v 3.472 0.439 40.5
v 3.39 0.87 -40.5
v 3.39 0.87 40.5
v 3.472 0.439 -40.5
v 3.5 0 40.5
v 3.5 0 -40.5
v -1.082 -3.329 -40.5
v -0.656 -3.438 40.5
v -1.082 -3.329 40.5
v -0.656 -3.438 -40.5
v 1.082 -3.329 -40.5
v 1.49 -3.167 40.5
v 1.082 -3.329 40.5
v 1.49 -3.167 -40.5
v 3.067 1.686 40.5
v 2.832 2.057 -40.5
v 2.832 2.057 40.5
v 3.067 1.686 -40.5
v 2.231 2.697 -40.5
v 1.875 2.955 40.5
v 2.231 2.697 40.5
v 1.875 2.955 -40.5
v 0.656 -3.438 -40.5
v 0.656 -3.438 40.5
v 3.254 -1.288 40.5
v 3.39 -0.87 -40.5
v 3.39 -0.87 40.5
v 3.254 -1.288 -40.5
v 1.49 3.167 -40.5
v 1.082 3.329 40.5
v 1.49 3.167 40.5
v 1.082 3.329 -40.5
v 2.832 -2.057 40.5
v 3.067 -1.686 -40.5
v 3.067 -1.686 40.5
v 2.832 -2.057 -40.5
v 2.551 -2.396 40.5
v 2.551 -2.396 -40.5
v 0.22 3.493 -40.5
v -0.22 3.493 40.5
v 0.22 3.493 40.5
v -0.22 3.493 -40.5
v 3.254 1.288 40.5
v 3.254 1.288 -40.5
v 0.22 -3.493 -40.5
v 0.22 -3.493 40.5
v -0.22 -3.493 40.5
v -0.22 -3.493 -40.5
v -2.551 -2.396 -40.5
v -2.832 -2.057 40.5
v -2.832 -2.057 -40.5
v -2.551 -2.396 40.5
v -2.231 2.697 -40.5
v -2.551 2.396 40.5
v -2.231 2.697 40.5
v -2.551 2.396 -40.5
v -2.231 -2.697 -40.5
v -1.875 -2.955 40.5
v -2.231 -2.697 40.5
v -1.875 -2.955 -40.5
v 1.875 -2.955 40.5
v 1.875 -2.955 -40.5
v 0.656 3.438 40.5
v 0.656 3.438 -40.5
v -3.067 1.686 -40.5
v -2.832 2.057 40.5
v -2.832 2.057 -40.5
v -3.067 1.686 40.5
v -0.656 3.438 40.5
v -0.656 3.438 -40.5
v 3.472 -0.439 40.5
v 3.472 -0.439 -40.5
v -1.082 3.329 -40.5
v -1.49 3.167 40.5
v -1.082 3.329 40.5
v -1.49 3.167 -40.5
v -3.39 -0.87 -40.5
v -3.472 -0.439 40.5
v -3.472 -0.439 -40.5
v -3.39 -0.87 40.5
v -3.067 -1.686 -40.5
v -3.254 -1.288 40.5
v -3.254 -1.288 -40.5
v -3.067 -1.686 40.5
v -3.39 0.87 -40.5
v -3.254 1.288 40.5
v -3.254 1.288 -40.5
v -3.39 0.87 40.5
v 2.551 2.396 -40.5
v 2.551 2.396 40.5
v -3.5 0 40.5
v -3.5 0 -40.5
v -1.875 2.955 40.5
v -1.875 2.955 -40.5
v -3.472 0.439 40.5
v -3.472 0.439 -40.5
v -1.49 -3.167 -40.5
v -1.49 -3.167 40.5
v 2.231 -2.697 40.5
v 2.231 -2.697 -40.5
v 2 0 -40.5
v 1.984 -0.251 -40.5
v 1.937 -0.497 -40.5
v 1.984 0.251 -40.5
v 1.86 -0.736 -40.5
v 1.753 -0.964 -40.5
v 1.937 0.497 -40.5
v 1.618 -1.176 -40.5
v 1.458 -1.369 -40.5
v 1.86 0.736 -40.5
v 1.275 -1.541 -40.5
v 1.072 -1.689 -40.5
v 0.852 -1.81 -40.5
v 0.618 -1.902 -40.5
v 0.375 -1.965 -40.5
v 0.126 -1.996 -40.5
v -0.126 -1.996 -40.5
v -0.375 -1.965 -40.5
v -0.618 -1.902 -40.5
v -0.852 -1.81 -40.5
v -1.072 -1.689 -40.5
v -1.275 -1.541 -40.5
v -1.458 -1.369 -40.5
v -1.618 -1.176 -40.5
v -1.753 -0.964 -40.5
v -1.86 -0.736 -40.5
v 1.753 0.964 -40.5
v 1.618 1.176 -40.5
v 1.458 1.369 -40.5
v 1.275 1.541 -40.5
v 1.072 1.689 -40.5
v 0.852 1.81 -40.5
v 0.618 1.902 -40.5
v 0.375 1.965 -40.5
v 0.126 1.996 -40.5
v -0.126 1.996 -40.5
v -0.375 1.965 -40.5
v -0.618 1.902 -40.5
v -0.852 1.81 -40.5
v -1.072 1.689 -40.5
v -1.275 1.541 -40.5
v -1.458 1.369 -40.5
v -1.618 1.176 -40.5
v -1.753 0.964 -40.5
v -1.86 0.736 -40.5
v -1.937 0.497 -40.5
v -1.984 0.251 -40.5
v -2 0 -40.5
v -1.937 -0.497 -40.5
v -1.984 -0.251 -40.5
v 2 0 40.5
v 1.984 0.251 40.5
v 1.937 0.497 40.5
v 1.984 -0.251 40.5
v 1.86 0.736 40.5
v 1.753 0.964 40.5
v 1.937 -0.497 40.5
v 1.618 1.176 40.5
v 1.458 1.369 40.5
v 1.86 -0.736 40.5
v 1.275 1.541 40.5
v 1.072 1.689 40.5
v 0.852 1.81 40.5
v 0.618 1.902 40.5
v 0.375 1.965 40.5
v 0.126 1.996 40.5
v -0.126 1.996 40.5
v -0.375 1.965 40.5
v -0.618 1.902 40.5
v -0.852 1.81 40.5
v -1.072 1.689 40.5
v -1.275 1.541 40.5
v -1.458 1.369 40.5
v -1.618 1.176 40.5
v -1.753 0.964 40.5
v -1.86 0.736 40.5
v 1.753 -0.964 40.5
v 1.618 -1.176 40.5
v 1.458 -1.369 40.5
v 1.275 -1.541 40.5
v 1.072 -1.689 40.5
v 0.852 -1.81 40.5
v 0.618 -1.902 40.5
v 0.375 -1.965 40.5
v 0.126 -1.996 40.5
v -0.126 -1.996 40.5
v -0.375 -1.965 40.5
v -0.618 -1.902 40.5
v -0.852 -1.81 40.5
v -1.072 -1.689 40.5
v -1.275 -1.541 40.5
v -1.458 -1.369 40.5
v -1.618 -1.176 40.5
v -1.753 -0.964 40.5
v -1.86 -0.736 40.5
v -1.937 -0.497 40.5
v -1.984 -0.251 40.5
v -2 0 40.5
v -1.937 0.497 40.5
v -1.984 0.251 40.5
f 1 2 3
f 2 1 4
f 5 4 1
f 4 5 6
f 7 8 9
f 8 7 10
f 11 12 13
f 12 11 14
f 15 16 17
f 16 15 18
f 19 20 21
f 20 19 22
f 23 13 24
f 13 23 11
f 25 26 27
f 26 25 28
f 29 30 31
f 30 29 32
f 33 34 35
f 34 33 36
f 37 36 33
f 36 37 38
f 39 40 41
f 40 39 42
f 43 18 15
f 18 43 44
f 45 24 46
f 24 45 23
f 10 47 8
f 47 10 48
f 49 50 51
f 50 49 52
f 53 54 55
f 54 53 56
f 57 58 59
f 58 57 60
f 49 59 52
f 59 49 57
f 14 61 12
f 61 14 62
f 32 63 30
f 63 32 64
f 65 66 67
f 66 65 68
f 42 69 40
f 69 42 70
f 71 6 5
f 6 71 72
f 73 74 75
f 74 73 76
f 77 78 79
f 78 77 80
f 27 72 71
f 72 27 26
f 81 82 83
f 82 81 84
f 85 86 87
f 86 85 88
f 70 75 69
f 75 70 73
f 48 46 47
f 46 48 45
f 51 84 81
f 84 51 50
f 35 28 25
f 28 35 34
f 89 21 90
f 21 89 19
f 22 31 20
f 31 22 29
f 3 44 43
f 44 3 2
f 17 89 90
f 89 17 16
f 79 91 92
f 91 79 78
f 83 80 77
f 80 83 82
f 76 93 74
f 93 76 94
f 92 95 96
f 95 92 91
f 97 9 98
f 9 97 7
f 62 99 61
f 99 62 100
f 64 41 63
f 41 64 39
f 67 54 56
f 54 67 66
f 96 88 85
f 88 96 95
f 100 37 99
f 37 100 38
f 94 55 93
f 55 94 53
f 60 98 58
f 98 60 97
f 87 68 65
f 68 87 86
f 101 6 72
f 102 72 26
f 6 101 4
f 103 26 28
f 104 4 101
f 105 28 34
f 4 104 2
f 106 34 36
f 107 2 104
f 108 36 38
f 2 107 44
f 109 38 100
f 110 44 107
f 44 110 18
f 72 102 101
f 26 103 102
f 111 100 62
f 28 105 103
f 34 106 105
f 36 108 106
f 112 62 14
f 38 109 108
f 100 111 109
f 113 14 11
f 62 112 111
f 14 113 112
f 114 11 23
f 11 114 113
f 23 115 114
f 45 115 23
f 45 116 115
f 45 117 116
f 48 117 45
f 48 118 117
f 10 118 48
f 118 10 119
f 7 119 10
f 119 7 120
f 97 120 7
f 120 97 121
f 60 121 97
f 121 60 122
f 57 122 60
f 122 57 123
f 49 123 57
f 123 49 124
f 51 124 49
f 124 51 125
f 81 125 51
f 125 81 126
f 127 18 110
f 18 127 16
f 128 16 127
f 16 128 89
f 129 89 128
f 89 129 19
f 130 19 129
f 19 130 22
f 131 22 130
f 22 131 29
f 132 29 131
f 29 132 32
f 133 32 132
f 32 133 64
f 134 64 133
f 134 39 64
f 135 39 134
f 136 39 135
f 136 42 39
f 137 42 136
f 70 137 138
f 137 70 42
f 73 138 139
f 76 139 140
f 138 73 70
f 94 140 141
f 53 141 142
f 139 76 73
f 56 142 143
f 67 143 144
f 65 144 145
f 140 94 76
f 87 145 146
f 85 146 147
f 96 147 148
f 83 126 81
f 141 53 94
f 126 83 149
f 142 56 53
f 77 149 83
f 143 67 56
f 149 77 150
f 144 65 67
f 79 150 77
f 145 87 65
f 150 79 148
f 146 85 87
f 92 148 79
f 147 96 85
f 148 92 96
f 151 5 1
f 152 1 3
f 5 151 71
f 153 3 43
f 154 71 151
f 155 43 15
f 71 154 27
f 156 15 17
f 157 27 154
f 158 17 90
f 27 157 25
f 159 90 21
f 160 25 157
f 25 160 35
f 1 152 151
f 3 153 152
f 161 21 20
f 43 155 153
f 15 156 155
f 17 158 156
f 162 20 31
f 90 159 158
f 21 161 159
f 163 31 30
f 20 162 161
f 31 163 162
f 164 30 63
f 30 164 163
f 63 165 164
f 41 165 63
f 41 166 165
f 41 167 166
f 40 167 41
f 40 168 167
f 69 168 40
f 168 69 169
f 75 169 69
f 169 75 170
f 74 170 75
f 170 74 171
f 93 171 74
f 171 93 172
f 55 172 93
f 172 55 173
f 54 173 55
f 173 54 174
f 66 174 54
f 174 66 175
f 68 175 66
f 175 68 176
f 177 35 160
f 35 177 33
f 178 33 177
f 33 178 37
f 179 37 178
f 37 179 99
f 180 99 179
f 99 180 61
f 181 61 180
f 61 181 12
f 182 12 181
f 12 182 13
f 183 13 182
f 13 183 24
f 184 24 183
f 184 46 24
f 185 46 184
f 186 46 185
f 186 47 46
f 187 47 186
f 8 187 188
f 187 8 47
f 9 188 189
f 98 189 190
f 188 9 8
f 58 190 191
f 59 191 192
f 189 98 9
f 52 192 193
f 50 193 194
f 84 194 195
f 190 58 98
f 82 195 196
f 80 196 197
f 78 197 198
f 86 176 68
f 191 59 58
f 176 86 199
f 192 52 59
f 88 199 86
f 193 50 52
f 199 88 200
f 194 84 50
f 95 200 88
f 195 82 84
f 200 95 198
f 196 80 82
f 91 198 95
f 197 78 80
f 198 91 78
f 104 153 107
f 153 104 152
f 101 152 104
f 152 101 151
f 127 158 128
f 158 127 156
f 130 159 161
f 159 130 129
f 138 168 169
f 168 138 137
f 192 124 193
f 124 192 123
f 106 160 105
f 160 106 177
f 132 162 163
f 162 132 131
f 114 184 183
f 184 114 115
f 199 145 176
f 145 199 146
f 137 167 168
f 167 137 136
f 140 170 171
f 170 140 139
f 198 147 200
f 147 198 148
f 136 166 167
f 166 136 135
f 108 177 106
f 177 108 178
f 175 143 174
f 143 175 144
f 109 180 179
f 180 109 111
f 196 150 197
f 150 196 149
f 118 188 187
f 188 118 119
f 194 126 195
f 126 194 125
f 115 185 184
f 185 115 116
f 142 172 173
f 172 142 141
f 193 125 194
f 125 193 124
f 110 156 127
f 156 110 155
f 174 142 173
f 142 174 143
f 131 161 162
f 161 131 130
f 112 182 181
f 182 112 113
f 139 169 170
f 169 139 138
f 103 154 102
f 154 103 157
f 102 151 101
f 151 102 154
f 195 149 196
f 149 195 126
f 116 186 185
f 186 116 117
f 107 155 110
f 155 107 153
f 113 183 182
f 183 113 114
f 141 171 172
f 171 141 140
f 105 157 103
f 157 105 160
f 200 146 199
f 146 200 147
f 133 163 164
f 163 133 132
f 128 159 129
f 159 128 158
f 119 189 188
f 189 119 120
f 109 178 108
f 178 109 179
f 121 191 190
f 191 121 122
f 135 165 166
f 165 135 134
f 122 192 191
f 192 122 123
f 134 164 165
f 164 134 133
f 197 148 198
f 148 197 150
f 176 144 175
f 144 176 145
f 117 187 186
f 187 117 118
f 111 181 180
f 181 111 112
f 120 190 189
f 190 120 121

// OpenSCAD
$fn = 50;


difference() {
	union() {
		translate(v = [0, 0, -40.5000000000]) {
			cylinder(h = 81, r = 3.5000000000);
		}
	}
	union() {
		translate(v = [0, 0, -100.0000000000]) {
			cylinder(h = 200, r = 2.0000000000);
		}
	}
}
